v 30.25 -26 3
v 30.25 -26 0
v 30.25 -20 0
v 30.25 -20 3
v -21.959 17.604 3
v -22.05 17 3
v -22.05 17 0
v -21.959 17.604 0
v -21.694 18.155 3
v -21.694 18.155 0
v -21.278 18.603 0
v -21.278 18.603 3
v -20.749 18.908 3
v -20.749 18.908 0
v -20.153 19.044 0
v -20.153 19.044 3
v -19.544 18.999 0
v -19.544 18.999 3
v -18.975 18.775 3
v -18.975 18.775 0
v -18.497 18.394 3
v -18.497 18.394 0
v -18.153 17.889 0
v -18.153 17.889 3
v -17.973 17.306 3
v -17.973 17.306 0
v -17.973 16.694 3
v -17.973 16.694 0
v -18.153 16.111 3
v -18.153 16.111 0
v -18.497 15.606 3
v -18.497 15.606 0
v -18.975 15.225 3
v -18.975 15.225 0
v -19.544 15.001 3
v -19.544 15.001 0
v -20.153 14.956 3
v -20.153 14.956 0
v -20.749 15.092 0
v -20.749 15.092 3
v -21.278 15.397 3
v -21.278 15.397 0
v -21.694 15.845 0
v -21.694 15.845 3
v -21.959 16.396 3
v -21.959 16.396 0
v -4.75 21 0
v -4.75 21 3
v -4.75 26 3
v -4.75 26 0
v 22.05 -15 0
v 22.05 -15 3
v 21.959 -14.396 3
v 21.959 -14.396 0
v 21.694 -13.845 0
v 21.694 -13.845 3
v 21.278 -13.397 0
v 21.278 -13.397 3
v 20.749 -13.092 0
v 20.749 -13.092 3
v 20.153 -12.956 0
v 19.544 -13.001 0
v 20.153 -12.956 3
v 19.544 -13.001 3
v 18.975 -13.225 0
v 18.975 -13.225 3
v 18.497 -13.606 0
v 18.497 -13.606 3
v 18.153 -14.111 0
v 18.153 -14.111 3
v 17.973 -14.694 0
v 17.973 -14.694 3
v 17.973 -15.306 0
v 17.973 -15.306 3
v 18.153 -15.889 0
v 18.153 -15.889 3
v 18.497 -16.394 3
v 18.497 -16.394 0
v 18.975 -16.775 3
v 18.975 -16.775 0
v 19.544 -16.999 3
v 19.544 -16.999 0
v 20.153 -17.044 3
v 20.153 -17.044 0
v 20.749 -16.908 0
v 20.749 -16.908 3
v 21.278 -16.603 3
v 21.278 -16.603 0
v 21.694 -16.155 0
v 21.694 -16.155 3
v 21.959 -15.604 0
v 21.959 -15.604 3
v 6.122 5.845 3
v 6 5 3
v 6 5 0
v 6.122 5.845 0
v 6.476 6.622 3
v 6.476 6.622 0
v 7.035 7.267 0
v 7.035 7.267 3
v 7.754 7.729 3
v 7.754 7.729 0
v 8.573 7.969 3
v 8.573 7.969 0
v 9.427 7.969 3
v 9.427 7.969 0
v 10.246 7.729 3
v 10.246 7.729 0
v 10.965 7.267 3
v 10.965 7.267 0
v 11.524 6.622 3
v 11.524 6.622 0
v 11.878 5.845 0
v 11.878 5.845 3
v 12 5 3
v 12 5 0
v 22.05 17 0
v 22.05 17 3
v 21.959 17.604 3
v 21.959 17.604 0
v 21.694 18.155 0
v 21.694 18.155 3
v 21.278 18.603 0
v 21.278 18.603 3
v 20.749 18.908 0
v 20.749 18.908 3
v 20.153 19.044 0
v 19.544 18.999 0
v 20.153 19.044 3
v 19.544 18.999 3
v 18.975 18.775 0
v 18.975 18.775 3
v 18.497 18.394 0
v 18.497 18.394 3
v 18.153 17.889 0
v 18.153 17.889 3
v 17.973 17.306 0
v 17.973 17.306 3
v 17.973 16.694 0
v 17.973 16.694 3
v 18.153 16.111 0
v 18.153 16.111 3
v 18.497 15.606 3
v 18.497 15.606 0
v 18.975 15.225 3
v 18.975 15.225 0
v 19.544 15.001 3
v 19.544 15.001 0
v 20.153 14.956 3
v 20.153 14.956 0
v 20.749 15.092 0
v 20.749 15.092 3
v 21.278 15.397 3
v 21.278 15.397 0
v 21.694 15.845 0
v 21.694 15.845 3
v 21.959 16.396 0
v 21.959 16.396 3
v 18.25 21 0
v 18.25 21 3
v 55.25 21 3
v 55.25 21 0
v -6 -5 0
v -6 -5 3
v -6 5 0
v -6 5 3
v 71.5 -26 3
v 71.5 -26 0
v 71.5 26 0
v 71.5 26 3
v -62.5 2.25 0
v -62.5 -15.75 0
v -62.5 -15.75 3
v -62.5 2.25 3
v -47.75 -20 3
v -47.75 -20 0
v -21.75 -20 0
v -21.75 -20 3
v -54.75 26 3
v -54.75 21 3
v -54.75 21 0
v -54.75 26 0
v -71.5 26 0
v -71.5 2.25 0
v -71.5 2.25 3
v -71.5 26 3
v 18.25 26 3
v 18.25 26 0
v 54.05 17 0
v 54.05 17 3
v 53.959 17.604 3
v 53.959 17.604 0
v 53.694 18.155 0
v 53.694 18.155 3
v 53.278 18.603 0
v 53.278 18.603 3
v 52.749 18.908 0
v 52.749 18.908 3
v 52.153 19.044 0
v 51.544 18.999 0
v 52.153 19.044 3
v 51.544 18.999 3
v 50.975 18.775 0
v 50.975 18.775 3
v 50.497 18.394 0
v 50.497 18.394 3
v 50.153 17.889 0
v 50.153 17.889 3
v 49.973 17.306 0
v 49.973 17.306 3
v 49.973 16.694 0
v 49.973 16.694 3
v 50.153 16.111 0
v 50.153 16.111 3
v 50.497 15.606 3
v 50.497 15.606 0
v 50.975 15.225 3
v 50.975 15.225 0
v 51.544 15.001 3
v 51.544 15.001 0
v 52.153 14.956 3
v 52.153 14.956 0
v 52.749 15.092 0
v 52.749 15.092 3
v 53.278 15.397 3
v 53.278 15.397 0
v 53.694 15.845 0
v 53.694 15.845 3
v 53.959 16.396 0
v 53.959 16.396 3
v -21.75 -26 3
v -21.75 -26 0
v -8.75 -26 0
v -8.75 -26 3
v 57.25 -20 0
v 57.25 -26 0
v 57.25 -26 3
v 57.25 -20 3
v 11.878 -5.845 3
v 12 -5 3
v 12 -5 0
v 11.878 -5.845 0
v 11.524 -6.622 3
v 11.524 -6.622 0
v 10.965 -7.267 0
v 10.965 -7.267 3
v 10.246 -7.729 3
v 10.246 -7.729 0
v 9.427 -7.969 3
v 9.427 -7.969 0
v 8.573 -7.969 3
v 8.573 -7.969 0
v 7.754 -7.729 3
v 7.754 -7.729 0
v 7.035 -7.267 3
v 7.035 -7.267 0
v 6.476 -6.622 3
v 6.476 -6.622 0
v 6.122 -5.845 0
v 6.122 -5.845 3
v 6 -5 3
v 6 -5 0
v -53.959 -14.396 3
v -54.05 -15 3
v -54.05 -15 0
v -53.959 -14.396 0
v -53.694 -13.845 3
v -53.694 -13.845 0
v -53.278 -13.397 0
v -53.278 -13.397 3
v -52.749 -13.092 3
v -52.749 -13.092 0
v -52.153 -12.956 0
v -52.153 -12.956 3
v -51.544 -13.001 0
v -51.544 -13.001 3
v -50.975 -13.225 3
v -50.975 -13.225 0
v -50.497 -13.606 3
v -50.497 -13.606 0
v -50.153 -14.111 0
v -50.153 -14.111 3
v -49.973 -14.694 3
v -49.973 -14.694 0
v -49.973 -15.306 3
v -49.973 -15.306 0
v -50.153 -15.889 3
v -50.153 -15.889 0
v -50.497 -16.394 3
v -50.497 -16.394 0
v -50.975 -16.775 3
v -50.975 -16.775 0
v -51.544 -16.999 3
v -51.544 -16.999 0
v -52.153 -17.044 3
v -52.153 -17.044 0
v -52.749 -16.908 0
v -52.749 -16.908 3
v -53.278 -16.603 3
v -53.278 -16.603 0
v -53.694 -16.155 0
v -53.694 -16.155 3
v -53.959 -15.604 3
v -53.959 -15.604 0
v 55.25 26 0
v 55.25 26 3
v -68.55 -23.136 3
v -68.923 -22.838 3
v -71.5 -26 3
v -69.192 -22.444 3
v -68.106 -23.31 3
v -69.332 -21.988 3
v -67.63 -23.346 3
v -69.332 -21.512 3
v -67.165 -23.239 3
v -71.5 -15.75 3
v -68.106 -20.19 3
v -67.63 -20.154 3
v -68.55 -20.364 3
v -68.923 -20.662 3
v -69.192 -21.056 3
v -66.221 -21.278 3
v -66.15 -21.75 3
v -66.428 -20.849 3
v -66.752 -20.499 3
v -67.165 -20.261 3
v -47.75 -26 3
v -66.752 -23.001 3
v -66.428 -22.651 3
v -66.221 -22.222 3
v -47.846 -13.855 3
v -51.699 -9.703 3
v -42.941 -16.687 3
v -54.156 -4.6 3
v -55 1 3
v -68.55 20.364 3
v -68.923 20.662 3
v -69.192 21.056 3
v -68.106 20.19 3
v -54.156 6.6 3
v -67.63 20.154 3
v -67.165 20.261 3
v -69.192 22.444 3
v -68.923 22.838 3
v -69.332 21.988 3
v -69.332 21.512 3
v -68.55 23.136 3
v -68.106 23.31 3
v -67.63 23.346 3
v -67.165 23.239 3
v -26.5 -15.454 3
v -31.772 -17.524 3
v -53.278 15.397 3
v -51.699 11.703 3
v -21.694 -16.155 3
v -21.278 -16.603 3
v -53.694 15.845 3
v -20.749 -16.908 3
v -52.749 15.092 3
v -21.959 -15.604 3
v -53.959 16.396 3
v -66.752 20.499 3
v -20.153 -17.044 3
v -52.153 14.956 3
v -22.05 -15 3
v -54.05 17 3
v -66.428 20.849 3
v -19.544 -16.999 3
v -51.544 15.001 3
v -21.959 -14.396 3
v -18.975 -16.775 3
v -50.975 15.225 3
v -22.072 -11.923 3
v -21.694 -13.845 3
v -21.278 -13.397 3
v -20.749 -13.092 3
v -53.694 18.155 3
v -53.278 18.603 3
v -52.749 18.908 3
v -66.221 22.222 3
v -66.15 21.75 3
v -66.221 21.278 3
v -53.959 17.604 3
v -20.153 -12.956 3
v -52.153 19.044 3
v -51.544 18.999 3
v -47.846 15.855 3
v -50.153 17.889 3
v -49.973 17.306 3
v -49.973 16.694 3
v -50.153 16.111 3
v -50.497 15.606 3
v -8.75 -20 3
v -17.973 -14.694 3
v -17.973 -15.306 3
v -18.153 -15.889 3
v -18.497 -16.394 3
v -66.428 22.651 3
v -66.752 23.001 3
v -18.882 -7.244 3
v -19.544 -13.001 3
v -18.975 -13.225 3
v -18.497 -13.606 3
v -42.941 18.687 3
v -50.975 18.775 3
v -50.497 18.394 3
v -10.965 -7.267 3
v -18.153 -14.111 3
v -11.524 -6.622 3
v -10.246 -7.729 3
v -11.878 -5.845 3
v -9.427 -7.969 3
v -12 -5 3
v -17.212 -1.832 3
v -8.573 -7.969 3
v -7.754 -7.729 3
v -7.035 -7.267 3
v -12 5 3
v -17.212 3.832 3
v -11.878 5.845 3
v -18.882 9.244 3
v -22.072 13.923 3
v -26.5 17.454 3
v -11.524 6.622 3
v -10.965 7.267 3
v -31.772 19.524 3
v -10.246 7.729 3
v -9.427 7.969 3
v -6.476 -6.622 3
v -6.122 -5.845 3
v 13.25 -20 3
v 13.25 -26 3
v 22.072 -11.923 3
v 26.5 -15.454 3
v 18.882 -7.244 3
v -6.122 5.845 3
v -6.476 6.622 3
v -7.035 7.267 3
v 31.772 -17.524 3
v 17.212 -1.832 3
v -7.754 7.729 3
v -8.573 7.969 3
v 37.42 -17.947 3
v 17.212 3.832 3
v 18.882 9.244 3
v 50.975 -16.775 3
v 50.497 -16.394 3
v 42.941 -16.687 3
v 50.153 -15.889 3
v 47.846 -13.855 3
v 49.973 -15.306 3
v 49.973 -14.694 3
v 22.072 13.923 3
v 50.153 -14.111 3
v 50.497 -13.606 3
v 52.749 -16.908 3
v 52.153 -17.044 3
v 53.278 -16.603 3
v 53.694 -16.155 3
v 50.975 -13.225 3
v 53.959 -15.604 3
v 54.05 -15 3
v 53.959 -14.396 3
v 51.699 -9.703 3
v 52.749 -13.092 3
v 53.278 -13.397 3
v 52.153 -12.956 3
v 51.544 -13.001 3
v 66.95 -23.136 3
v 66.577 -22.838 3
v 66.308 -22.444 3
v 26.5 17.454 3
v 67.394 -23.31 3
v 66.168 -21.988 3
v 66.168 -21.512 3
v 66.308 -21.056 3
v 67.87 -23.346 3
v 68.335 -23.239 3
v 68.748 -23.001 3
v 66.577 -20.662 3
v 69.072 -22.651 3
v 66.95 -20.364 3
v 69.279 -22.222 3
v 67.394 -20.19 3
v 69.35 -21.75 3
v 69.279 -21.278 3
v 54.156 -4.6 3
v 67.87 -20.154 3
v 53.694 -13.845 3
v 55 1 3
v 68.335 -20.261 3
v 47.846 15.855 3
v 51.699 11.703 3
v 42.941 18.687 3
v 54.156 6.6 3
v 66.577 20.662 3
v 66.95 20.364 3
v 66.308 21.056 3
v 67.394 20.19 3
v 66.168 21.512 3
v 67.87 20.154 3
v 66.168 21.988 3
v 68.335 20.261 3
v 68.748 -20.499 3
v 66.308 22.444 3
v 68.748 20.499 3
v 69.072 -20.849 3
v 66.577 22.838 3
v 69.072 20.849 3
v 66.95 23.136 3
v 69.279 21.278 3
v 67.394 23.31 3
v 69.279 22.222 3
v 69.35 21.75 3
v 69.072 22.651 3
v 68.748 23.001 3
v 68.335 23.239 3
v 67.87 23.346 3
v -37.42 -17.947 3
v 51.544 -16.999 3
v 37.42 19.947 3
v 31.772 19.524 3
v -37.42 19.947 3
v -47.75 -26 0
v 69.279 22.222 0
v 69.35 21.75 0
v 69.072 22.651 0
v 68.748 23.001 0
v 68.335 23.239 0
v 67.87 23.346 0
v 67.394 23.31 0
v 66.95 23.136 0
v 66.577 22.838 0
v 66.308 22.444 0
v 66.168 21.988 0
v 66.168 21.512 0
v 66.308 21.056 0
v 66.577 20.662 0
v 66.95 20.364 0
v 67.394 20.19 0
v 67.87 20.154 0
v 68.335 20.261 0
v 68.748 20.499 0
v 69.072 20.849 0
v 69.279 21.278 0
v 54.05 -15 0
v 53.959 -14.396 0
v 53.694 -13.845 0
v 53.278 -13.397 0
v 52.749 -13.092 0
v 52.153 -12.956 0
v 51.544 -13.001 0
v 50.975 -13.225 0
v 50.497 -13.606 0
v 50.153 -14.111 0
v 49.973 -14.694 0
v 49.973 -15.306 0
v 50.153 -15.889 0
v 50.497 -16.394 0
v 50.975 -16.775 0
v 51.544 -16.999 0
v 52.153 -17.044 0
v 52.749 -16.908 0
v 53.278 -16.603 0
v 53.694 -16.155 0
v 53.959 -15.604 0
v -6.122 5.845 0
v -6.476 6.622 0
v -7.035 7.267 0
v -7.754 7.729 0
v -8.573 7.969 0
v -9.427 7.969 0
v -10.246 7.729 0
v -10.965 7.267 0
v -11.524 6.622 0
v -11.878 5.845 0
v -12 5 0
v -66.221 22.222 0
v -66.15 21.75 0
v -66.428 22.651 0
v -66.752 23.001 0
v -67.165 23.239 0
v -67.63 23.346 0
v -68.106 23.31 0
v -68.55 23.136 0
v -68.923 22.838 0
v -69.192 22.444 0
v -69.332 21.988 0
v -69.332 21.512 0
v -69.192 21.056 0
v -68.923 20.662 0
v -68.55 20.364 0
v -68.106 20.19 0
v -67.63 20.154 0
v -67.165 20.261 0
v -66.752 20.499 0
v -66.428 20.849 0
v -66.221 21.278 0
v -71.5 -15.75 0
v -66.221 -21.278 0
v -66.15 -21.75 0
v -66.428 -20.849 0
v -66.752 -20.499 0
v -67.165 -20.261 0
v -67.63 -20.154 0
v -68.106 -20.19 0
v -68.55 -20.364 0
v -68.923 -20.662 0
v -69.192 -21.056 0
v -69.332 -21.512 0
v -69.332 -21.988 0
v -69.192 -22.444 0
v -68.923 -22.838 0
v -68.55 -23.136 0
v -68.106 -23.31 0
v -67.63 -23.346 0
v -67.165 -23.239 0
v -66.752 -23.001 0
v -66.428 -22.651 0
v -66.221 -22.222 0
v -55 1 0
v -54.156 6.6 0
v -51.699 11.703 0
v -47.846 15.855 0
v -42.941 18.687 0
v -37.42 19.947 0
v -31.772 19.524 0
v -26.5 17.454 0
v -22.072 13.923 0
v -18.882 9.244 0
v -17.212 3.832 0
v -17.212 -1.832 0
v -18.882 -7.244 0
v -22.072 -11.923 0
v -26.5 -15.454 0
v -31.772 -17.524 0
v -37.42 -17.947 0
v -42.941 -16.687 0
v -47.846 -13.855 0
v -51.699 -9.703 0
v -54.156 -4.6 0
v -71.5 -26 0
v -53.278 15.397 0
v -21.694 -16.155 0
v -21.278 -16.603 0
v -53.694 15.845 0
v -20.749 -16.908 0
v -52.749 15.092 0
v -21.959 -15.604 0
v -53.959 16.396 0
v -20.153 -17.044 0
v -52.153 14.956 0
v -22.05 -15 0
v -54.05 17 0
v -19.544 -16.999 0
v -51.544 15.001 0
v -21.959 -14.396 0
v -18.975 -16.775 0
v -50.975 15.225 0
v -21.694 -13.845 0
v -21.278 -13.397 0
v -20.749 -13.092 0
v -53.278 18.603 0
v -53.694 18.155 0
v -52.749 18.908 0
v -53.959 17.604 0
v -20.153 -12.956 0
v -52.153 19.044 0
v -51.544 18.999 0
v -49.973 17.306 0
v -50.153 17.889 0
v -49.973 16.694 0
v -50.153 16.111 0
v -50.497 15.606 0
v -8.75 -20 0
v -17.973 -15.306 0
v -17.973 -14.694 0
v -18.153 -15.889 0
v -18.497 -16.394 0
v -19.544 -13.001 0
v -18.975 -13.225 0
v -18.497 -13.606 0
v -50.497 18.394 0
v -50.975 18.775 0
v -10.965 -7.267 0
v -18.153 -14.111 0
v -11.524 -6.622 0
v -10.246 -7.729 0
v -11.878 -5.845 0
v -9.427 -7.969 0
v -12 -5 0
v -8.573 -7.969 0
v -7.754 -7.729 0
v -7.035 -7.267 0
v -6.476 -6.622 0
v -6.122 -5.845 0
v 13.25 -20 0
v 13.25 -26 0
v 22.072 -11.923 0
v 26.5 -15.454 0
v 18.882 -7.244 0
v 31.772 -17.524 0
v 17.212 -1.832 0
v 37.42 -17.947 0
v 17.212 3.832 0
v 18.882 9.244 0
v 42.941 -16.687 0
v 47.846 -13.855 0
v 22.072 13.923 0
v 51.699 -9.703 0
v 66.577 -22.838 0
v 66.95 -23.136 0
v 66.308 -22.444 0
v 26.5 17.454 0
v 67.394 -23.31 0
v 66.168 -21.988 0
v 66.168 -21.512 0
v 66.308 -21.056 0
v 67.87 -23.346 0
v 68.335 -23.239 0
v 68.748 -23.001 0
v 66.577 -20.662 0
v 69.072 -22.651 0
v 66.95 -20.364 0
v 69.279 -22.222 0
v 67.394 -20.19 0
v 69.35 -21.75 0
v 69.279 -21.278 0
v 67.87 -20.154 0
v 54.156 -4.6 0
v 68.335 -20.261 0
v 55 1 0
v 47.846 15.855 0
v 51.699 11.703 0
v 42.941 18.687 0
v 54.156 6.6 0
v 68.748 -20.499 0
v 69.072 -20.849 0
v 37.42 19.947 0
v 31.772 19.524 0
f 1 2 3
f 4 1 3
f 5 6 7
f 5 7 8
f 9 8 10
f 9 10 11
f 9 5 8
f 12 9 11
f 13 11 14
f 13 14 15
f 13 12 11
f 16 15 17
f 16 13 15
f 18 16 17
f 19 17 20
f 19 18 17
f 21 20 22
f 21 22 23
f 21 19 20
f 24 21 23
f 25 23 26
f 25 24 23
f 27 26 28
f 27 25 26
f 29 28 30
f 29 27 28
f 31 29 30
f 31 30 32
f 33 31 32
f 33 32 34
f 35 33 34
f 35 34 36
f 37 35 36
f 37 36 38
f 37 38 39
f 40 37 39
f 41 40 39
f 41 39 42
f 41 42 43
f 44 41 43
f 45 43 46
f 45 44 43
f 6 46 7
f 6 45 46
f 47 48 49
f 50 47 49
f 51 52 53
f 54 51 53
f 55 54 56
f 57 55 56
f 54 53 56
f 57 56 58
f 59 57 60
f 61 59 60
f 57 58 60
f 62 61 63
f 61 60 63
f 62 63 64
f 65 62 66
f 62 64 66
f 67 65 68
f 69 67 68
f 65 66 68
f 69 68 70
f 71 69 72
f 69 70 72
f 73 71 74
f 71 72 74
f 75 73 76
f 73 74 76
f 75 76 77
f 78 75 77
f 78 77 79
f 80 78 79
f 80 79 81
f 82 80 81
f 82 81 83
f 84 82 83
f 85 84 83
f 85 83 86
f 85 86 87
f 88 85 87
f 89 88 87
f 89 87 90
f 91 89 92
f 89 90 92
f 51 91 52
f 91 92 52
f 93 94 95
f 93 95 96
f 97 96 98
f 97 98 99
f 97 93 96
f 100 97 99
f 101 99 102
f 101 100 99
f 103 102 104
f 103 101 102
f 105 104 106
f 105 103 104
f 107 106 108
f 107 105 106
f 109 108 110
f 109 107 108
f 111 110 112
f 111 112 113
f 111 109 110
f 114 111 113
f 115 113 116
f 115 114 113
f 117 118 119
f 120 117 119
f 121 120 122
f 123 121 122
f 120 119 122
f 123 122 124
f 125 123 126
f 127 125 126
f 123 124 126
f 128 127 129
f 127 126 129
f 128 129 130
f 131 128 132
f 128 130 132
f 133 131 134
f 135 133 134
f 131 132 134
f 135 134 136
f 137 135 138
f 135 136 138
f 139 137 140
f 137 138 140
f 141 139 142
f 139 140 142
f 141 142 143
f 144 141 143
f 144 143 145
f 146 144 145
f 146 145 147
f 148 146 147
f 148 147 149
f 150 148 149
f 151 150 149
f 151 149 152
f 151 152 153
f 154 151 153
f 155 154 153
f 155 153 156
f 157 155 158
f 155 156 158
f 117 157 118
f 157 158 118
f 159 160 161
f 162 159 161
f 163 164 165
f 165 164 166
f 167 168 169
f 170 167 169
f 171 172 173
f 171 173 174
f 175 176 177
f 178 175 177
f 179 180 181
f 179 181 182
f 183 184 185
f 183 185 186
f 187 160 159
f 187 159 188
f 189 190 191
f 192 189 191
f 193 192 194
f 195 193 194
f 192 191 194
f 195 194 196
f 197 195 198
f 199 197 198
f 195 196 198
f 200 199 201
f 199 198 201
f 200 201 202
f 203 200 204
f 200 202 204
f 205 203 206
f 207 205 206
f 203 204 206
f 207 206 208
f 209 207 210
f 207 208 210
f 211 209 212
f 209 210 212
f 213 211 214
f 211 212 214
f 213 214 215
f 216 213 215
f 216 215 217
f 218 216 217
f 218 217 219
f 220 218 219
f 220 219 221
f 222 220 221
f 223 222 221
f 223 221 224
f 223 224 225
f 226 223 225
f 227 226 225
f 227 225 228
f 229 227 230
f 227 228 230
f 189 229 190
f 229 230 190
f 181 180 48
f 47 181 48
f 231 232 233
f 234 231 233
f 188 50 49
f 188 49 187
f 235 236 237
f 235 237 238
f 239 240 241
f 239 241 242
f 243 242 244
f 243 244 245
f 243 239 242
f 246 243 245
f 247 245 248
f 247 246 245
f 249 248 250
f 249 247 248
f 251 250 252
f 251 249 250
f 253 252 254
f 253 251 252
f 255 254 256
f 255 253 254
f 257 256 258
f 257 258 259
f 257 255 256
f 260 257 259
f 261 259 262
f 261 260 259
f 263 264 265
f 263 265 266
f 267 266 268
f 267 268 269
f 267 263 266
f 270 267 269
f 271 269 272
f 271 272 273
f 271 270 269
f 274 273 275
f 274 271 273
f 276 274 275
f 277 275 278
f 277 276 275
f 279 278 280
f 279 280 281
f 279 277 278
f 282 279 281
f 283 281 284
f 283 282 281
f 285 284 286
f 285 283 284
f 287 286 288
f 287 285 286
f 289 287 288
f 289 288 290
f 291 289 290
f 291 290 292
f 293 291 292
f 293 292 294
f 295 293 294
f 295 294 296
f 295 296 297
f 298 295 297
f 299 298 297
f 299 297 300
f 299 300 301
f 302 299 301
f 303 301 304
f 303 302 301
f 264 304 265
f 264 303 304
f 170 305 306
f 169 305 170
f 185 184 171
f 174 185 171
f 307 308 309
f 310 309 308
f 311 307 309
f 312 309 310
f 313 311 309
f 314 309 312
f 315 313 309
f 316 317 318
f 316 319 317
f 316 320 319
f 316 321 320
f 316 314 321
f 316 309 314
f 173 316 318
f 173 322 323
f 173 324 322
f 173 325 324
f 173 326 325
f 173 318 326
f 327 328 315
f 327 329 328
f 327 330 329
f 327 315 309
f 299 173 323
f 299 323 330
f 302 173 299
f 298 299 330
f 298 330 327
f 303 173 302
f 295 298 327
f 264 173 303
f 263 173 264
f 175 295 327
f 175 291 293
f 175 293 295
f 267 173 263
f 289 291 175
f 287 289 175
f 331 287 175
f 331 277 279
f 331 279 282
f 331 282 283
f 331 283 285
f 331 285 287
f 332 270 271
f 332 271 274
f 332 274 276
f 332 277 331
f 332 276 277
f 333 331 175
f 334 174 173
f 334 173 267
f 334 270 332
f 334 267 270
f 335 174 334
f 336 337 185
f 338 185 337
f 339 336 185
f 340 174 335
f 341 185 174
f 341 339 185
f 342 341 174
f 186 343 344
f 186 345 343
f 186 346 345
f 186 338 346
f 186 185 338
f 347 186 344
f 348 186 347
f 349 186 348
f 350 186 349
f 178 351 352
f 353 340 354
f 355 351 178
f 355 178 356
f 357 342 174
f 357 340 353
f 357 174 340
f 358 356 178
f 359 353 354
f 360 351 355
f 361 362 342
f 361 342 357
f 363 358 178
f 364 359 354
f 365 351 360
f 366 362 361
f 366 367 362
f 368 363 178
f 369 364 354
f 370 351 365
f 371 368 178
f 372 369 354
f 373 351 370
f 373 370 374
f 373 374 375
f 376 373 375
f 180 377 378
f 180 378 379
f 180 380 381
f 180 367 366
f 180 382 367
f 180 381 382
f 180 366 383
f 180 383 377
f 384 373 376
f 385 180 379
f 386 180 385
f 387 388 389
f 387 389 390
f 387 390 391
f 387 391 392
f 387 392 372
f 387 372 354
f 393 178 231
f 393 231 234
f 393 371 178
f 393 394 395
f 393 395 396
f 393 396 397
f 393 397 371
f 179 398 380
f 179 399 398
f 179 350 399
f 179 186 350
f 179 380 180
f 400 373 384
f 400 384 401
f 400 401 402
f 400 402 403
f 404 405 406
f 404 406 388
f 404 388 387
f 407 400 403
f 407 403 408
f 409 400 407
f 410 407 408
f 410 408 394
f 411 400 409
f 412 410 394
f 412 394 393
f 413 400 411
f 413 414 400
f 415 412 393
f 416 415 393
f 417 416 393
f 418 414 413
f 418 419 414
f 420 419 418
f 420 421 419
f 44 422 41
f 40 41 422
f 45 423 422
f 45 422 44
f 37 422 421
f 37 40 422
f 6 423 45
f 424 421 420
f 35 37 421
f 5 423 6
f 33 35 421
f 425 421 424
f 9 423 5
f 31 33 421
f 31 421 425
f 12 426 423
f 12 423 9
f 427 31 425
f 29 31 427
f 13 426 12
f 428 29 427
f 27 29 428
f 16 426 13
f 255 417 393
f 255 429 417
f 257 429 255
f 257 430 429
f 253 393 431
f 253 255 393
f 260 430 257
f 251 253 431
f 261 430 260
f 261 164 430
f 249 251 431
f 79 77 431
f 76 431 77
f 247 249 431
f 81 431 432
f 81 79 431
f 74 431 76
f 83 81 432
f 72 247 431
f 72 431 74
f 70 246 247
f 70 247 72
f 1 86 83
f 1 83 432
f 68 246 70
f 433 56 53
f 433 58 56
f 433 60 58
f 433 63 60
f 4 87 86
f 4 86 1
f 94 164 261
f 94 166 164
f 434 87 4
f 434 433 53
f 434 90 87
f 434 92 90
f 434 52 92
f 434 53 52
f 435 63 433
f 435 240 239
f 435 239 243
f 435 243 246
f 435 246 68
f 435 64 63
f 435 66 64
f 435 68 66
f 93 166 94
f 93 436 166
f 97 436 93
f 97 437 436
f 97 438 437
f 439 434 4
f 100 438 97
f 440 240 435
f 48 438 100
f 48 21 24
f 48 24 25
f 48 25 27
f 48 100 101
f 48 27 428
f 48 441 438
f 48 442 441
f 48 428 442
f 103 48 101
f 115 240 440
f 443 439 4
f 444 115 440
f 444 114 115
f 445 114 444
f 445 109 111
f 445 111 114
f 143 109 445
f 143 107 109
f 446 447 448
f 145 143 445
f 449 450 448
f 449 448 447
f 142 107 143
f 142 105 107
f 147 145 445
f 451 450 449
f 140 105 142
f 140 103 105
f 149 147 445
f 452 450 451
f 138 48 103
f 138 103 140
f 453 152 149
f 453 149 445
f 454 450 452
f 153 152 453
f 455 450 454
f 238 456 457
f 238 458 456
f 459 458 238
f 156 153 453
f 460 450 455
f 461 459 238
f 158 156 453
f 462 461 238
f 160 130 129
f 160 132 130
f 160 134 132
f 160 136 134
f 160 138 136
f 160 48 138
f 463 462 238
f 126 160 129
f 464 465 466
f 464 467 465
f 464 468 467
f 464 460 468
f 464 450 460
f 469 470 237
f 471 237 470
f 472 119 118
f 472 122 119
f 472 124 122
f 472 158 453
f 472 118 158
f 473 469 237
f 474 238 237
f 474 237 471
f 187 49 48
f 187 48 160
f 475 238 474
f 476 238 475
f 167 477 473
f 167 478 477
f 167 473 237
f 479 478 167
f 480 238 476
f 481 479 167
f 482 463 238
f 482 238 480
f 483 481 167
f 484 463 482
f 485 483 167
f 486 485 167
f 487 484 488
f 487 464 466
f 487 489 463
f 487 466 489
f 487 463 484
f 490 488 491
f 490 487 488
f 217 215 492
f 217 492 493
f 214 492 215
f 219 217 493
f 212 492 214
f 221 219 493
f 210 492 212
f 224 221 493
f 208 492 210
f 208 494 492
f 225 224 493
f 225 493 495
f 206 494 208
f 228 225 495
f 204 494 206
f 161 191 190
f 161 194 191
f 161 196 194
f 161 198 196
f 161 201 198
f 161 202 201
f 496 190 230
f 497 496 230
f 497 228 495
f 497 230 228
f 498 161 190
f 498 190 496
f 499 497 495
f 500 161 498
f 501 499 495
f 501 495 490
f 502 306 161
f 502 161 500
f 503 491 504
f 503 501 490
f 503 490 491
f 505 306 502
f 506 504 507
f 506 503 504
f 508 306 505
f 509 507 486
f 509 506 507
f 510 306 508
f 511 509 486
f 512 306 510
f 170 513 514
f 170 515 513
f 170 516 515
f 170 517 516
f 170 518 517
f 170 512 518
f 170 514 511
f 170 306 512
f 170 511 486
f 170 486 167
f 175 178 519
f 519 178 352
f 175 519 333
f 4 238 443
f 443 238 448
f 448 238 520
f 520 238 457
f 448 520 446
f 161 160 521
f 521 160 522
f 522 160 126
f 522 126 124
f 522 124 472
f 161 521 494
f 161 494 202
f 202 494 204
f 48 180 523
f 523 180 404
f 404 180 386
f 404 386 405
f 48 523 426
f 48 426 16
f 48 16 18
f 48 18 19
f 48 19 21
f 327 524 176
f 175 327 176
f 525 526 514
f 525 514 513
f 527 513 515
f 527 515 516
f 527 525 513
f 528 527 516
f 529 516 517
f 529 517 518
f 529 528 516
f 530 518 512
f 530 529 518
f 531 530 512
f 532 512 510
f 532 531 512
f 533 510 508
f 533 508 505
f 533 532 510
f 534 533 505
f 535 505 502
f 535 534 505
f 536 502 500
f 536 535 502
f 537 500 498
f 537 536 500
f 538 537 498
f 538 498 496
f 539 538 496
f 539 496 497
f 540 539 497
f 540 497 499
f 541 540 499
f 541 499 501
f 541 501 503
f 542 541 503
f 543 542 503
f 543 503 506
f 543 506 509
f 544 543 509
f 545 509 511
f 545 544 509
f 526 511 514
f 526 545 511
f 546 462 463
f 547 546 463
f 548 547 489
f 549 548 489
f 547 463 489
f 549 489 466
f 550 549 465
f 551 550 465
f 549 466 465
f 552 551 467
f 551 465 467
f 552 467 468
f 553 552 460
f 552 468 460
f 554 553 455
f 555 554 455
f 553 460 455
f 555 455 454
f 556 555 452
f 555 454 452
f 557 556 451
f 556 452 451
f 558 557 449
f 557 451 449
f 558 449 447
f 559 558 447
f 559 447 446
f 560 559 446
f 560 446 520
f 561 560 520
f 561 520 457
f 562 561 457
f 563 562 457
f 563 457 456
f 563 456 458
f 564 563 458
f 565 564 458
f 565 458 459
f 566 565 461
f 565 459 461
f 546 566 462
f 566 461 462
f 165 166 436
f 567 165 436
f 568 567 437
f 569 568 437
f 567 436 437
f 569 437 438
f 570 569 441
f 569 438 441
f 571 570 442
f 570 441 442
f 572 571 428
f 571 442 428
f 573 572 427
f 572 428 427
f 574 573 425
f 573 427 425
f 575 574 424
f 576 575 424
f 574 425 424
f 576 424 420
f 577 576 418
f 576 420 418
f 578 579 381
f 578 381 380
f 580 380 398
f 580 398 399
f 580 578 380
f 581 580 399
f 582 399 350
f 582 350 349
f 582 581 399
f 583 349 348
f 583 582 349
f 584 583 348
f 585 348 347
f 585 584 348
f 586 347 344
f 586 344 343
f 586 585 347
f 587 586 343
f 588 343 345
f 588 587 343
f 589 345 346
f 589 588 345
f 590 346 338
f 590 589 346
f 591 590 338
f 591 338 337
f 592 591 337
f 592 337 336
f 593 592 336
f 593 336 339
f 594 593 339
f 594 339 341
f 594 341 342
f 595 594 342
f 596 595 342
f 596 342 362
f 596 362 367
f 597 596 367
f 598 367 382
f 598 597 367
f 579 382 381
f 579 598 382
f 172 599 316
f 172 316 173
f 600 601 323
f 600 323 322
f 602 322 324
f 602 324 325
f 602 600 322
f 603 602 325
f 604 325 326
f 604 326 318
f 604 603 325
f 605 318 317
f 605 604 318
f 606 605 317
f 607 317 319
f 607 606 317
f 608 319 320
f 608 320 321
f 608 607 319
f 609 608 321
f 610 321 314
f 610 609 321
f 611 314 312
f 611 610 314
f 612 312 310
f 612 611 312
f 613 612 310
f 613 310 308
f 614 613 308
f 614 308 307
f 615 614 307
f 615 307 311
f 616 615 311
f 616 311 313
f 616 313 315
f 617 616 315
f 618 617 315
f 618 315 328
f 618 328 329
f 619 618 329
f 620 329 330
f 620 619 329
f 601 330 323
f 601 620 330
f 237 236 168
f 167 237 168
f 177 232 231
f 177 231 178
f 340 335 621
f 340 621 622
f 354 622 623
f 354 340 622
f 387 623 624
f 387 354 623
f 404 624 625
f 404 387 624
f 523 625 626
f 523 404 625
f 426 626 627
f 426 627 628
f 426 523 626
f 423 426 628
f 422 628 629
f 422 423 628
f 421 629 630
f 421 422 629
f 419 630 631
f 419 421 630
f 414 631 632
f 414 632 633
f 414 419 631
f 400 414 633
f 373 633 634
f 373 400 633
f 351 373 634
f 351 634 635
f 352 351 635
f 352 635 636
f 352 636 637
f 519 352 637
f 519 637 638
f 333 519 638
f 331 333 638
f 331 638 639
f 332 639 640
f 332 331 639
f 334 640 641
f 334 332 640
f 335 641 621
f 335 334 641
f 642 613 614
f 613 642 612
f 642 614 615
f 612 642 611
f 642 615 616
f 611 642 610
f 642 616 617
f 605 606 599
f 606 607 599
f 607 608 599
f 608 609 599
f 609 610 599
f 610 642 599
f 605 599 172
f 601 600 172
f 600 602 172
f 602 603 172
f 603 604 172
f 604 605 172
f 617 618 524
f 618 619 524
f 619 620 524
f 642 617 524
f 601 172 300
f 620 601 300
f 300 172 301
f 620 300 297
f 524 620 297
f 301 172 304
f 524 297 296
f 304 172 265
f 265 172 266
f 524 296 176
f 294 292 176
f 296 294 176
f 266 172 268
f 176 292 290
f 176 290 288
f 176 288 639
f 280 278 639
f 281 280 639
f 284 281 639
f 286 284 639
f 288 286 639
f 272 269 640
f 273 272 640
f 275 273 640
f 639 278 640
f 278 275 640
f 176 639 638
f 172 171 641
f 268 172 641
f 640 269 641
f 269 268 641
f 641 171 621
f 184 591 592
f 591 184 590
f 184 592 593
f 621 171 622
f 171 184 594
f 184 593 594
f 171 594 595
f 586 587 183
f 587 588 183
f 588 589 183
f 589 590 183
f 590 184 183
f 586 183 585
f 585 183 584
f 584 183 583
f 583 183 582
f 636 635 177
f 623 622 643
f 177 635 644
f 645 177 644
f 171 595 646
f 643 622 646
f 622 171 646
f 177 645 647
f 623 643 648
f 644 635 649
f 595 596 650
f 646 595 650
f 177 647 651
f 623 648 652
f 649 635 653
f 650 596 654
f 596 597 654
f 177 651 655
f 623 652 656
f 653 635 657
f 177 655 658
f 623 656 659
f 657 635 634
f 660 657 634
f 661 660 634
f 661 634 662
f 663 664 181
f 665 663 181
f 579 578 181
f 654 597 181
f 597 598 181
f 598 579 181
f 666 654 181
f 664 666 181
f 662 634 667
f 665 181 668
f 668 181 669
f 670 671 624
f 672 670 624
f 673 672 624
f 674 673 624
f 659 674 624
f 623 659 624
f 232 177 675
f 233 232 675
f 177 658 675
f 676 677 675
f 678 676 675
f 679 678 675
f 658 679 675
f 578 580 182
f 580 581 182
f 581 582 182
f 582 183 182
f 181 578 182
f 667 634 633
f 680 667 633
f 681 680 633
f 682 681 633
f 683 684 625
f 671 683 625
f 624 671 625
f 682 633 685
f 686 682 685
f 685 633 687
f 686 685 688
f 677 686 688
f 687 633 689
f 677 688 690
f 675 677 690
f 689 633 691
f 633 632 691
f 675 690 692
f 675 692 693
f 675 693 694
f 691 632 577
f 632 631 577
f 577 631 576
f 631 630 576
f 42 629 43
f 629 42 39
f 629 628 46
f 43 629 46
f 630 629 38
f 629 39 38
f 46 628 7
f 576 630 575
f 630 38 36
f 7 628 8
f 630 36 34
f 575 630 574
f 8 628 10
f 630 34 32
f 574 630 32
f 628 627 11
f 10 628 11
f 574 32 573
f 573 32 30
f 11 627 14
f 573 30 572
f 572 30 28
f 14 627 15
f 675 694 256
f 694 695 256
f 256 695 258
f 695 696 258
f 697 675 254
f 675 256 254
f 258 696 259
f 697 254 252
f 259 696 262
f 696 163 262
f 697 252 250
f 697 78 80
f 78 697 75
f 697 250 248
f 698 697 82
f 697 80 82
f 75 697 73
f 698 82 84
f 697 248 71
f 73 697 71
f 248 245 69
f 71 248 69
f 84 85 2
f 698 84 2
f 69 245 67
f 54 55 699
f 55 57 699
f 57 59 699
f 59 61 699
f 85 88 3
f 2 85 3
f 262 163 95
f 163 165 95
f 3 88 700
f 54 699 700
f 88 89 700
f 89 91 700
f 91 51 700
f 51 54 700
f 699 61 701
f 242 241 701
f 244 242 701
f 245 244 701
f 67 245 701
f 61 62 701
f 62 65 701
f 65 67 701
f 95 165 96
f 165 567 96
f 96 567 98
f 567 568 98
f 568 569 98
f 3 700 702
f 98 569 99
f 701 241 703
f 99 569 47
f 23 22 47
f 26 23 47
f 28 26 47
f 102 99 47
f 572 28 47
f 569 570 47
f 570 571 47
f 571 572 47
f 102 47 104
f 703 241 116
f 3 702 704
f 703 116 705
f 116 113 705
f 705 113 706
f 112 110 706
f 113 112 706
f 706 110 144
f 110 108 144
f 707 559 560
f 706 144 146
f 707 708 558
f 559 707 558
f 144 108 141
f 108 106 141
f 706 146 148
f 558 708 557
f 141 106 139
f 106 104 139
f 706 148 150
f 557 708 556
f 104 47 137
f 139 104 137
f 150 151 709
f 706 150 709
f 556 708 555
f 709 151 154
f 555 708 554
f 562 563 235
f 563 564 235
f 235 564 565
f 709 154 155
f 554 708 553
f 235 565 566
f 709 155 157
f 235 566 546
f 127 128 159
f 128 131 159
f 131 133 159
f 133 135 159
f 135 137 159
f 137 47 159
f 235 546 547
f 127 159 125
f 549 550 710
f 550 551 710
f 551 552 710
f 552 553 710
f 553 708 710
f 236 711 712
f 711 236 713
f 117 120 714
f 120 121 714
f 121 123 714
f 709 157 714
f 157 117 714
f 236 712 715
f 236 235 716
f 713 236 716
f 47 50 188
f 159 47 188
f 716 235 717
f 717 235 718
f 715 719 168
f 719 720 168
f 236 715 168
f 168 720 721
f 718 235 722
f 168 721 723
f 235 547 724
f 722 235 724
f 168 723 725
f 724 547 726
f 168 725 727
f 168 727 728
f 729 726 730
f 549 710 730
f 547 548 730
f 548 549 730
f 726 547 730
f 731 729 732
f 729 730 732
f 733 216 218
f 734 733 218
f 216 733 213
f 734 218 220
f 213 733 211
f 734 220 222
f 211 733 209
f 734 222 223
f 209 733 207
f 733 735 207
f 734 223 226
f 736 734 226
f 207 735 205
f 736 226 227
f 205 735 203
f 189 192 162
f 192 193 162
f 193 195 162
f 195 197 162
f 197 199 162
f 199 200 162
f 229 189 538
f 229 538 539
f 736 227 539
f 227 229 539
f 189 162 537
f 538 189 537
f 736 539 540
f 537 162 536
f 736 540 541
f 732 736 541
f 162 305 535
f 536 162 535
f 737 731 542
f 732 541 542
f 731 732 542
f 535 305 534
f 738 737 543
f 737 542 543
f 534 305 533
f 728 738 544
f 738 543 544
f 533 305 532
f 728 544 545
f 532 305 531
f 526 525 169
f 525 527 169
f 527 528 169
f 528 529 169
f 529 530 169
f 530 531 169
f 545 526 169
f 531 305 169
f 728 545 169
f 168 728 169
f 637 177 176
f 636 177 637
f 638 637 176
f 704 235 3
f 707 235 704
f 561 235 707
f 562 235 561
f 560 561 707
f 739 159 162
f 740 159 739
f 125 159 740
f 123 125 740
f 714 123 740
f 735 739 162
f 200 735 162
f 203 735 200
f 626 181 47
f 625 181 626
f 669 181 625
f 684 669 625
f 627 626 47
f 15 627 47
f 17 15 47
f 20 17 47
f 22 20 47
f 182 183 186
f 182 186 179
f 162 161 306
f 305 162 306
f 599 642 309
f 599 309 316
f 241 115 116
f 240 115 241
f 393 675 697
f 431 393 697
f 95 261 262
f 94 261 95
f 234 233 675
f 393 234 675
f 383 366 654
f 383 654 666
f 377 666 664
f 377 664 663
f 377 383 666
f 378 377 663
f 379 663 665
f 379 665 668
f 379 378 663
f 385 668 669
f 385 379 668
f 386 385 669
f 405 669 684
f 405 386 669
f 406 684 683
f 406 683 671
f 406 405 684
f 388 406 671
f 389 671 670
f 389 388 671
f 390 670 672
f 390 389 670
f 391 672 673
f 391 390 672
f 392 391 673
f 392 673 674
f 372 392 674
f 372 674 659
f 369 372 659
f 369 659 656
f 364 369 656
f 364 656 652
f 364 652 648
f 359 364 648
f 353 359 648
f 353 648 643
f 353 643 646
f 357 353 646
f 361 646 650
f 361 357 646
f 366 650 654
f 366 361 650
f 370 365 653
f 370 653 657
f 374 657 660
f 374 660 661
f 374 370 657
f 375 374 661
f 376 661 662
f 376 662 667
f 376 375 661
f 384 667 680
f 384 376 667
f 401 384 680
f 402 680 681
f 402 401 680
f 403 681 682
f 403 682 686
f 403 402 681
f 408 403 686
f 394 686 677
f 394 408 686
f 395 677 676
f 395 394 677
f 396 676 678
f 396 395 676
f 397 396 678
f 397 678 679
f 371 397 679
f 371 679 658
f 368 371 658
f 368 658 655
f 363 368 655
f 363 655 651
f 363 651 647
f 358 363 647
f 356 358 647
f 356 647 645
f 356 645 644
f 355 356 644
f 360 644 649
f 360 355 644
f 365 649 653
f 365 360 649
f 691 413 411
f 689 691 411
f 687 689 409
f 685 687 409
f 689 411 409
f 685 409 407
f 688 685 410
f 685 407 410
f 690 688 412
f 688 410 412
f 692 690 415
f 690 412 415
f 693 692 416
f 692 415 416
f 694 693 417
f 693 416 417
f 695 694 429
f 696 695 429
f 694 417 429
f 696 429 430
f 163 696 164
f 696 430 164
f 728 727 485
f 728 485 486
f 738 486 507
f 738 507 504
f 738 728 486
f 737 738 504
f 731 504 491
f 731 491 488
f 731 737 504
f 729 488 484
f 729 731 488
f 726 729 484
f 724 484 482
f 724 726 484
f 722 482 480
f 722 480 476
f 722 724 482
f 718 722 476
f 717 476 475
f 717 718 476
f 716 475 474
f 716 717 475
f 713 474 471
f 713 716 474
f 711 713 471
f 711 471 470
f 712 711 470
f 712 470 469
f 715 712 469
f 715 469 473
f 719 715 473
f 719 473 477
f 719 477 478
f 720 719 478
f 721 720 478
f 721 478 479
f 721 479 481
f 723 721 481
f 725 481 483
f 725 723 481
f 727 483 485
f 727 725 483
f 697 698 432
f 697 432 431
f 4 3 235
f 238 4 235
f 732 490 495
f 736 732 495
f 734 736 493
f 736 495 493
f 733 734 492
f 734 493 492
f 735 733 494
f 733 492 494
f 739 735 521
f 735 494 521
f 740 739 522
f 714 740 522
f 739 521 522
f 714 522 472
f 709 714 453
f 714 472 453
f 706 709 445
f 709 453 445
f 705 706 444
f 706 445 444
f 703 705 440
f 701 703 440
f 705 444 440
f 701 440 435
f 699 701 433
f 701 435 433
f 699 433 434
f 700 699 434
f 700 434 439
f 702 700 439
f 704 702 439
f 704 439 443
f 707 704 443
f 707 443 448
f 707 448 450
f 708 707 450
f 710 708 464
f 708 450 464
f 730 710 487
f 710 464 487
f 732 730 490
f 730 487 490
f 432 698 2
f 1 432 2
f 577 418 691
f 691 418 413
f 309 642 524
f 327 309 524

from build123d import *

# Parameters (mm, degrees)
SKETCH1_W               = 143
SKETCH1_H               = 52
SKETCH1_R               = 1.6
BOSS_EXTRUDE1_DEPTH     = 3
CUT_EXTRUDE1_DEPTH      = 77.139674284
CUT_EXTRUDE1_DEPTH_BACK = 10
SKETCH2_W               = 26
SKETCH2_H               = 6
SKETCH2_W_2             = 22
SKETCH2_W_3             = 27
SKETCH2_W_4             = 9
SKETCH2_H_2             = 18
SKETCH4_W               = 50
SKETCH4_H               = 5
SKETCH4_W_2             = 37
CUT_EXTRUDE2_DEPTH      = 3
SKETCH5_R               = 2.05
SKETCH5_R_2             = 19
CUT_EXTRUDE3_DEPTH      = 3
CUT_EXTRUDE4_DEPTH      = 3


with BuildPart() as part:
    # Sketch1 → Boss-Extrude1 (new body)
    with BuildSketch(Plane.XY):
        Rectangle(SKETCH1_W, SKETCH1_H)
        with Locations((-67.75, 21.75)):
            Circle(SKETCH1_R, mode=Mode.SUBTRACT)
        with Locations((-67.75, -21.75)):
            Circle(SKETCH1_R, mode=Mode.SUBTRACT)
        with Locations((67.75, 21.75)):
            Circle(SKETCH1_R, mode=Mode.SUBTRACT)
        with Locations((67.75, -21.75)):
            Circle(SKETCH1_R, mode=Mode.SUBTRACT)
    extrude(amount=BOSS_EXTRUDE1_DEPTH)

    # Sketch2 → Cut-Extrude1 (cut, two sides: drawn at the far end of the back side and taken through both)
    with BuildSketch(Plane.XY.offset(3).offset(-CUT_EXTRUDE1_DEPTH_BACK)):
        with Locations((-34.75, -23)):
            Rectangle(SKETCH2_W, SKETCH2_H)
        with Locations((2.25, -23)):
            Rectangle(SKETCH2_W_2, SKETCH2_H)
        with Locations((43.75, -23)):
            Rectangle(SKETCH2_W_3, SKETCH2_H)
        with Locations((-67, -6.75)):
            Rectangle(SKETCH2_W_4, SKETCH2_H_2)
    extrude(amount=CUT_EXTRUDE1_DEPTH + CUT_EXTRUDE1_DEPTH_BACK, mode=Mode.SUBTRACT)

    # Sketch4 → Cut-Extrude2 (cut)
    with BuildSketch(Plane.XY.offset(3)):
        with Locations((-29.75, 23.5)):
            Rectangle(SKETCH4_W, SKETCH4_H)
        with Locations((36.75, 23.5)):
            Rectangle(SKETCH4_W_2, SKETCH4_H)
    extrude(amount=-CUT_EXTRUDE2_DEPTH, mode=Mode.SUBTRACT)

    # Sketch5 → Cut-Extrude3 (cut)
    with BuildSketch(Plane.XY.offset(3)):
        with Locations((52, -15)):
            Circle(SKETCH5_R)
        with Locations((20, -15)):
            Circle(SKETCH5_R)
        with Locations((20, 17)):
            Circle(SKETCH5_R)
        with Locations((52, 17)):
            Circle(SKETCH5_R)
        with Locations((36, 1)):
            Circle(SKETCH5_R_2)
    cut_extrude3 = extrude(amount=-CUT_EXTRUDE3_DEPTH, mode=Mode.SUBTRACT)

    # Mirror1: Cut-Extrude3 across plane
    add(cut_extrude3.mirror(Plane(origin=(0, 0, 0), x_dir=(0, 0, 1), z_dir=(1, 0, 0))), mode=Mode.SUBTRACT)

    # Sketch6 → Cut-Extrude4 (cut)
    with BuildSketch(Plane.XY.offset(3)):
        with BuildLine():
            Line((6, -5), (6, 5))
            ThreePointArc((6, 5), (9, 8), (12, 5))
            Line((12, 5), (12, -5))
            ThreePointArc((12, -5), (9, -8), (6, -5))
        make_face()
        with BuildLine():
            Line((-6, -5), (-6, 5))
            ThreePointArc((-6, 5), (-9, 8), (-12, 5))
            Line((-12, 5), (-12, -5))
            ThreePointArc((-12, -5), (-9, -8), (-6, -5))
        make_face()
    extrude(amount=-CUT_EXTRUDE4_DEPTH, mode=Mode.SUBTRACT)


solid = part.part
